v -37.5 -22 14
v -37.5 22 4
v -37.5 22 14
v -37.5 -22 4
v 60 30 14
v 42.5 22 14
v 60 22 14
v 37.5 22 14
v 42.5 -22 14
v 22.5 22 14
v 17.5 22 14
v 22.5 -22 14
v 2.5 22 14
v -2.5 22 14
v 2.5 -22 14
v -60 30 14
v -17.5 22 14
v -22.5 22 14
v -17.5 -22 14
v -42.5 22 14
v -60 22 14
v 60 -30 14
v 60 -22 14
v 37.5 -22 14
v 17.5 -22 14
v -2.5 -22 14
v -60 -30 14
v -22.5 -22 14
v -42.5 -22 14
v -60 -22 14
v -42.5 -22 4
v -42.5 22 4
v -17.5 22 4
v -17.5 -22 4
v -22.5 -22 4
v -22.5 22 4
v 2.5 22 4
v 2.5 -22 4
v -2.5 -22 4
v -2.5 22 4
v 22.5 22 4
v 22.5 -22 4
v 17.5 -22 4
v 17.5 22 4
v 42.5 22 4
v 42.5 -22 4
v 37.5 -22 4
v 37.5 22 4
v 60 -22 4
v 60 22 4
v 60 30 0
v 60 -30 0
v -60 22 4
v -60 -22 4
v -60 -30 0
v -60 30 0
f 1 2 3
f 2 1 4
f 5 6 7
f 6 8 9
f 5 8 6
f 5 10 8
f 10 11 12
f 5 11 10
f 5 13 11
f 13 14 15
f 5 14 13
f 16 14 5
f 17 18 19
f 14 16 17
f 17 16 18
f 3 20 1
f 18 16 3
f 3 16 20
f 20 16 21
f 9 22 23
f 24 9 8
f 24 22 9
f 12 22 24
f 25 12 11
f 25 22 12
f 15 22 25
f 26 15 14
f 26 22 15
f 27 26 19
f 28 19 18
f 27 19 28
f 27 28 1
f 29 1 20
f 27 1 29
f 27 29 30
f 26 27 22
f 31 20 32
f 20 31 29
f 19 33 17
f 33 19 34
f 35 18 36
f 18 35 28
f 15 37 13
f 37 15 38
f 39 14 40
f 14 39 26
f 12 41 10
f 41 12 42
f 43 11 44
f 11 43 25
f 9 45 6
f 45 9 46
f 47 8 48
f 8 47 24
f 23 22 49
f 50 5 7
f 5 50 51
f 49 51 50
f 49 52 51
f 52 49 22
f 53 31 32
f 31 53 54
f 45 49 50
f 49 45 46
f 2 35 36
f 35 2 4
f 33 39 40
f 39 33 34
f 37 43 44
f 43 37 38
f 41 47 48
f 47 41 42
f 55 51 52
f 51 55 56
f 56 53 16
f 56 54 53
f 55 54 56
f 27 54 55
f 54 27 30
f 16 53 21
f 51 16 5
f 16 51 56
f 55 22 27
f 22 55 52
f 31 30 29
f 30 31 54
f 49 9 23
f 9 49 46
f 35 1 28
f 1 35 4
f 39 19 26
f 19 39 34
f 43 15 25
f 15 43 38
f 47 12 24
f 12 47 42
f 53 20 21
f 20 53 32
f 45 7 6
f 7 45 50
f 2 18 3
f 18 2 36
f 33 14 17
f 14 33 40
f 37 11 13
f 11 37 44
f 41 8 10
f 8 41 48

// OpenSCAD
$fn = 32;

// ----------------------------------------------------------------------
// Rib frame 120 x 60 x 14
// 5 ribs at 20 mm pitch
// ----------------------------------------------------------------------

// --- parameters (mm) ---
frame = [120, 60, 4];  // base plate size (x, y, z)
rail_w = 8;            // side rail width
ribs = 5;              // number of ribs
rib_t = 5;             // rib thickness
rib_h = 10;            // rib height above the base plate
pitch = 20;            // pitch between rib centres

// --- derived feature positions (mm) ---
span = (ribs - 1) * pitch;          // = 80   distance between the outer ribs
origin_x = -span / 2;               // = -40   X of the first rib
rib_len = frame[1] - 2 * rail_w + 2;  // = 46   rib length, 1 mm into each rail
feature_centers = [
  [origin_x + 0 * pitch, 0],
  [origin_x + 1 * pitch, 0],
  [origin_x + 2 * pitch, 0],
  [origin_x + 3 * pitch, 0],
  [origin_x + 4 * pitch, 0]
];   // rib centre line, drives the rib loop

// base plate, two side rails, then the ribs read straight off feature_centers
union() {
  translate([-frame[0] / 2, -frame[1] / 2, 0]) cube(frame);
  translate([-frame[0] / 2, -frame[1] / 2, 0]) cube([frame[0], rail_w, frame[2] + rib_h]);
  translate([-frame[0] / 2, frame[1] / 2 - rail_w, 0]) cube([frame[0], rail_w, frame[2] + rib_h]);
  for (centre = feature_centers)
    translate([centre[0] - rib_t / 2, centre[1] - rib_len / 2, frame[2] - 1])
      cube([rib_t, rib_len, rib_h + 1]);
}
